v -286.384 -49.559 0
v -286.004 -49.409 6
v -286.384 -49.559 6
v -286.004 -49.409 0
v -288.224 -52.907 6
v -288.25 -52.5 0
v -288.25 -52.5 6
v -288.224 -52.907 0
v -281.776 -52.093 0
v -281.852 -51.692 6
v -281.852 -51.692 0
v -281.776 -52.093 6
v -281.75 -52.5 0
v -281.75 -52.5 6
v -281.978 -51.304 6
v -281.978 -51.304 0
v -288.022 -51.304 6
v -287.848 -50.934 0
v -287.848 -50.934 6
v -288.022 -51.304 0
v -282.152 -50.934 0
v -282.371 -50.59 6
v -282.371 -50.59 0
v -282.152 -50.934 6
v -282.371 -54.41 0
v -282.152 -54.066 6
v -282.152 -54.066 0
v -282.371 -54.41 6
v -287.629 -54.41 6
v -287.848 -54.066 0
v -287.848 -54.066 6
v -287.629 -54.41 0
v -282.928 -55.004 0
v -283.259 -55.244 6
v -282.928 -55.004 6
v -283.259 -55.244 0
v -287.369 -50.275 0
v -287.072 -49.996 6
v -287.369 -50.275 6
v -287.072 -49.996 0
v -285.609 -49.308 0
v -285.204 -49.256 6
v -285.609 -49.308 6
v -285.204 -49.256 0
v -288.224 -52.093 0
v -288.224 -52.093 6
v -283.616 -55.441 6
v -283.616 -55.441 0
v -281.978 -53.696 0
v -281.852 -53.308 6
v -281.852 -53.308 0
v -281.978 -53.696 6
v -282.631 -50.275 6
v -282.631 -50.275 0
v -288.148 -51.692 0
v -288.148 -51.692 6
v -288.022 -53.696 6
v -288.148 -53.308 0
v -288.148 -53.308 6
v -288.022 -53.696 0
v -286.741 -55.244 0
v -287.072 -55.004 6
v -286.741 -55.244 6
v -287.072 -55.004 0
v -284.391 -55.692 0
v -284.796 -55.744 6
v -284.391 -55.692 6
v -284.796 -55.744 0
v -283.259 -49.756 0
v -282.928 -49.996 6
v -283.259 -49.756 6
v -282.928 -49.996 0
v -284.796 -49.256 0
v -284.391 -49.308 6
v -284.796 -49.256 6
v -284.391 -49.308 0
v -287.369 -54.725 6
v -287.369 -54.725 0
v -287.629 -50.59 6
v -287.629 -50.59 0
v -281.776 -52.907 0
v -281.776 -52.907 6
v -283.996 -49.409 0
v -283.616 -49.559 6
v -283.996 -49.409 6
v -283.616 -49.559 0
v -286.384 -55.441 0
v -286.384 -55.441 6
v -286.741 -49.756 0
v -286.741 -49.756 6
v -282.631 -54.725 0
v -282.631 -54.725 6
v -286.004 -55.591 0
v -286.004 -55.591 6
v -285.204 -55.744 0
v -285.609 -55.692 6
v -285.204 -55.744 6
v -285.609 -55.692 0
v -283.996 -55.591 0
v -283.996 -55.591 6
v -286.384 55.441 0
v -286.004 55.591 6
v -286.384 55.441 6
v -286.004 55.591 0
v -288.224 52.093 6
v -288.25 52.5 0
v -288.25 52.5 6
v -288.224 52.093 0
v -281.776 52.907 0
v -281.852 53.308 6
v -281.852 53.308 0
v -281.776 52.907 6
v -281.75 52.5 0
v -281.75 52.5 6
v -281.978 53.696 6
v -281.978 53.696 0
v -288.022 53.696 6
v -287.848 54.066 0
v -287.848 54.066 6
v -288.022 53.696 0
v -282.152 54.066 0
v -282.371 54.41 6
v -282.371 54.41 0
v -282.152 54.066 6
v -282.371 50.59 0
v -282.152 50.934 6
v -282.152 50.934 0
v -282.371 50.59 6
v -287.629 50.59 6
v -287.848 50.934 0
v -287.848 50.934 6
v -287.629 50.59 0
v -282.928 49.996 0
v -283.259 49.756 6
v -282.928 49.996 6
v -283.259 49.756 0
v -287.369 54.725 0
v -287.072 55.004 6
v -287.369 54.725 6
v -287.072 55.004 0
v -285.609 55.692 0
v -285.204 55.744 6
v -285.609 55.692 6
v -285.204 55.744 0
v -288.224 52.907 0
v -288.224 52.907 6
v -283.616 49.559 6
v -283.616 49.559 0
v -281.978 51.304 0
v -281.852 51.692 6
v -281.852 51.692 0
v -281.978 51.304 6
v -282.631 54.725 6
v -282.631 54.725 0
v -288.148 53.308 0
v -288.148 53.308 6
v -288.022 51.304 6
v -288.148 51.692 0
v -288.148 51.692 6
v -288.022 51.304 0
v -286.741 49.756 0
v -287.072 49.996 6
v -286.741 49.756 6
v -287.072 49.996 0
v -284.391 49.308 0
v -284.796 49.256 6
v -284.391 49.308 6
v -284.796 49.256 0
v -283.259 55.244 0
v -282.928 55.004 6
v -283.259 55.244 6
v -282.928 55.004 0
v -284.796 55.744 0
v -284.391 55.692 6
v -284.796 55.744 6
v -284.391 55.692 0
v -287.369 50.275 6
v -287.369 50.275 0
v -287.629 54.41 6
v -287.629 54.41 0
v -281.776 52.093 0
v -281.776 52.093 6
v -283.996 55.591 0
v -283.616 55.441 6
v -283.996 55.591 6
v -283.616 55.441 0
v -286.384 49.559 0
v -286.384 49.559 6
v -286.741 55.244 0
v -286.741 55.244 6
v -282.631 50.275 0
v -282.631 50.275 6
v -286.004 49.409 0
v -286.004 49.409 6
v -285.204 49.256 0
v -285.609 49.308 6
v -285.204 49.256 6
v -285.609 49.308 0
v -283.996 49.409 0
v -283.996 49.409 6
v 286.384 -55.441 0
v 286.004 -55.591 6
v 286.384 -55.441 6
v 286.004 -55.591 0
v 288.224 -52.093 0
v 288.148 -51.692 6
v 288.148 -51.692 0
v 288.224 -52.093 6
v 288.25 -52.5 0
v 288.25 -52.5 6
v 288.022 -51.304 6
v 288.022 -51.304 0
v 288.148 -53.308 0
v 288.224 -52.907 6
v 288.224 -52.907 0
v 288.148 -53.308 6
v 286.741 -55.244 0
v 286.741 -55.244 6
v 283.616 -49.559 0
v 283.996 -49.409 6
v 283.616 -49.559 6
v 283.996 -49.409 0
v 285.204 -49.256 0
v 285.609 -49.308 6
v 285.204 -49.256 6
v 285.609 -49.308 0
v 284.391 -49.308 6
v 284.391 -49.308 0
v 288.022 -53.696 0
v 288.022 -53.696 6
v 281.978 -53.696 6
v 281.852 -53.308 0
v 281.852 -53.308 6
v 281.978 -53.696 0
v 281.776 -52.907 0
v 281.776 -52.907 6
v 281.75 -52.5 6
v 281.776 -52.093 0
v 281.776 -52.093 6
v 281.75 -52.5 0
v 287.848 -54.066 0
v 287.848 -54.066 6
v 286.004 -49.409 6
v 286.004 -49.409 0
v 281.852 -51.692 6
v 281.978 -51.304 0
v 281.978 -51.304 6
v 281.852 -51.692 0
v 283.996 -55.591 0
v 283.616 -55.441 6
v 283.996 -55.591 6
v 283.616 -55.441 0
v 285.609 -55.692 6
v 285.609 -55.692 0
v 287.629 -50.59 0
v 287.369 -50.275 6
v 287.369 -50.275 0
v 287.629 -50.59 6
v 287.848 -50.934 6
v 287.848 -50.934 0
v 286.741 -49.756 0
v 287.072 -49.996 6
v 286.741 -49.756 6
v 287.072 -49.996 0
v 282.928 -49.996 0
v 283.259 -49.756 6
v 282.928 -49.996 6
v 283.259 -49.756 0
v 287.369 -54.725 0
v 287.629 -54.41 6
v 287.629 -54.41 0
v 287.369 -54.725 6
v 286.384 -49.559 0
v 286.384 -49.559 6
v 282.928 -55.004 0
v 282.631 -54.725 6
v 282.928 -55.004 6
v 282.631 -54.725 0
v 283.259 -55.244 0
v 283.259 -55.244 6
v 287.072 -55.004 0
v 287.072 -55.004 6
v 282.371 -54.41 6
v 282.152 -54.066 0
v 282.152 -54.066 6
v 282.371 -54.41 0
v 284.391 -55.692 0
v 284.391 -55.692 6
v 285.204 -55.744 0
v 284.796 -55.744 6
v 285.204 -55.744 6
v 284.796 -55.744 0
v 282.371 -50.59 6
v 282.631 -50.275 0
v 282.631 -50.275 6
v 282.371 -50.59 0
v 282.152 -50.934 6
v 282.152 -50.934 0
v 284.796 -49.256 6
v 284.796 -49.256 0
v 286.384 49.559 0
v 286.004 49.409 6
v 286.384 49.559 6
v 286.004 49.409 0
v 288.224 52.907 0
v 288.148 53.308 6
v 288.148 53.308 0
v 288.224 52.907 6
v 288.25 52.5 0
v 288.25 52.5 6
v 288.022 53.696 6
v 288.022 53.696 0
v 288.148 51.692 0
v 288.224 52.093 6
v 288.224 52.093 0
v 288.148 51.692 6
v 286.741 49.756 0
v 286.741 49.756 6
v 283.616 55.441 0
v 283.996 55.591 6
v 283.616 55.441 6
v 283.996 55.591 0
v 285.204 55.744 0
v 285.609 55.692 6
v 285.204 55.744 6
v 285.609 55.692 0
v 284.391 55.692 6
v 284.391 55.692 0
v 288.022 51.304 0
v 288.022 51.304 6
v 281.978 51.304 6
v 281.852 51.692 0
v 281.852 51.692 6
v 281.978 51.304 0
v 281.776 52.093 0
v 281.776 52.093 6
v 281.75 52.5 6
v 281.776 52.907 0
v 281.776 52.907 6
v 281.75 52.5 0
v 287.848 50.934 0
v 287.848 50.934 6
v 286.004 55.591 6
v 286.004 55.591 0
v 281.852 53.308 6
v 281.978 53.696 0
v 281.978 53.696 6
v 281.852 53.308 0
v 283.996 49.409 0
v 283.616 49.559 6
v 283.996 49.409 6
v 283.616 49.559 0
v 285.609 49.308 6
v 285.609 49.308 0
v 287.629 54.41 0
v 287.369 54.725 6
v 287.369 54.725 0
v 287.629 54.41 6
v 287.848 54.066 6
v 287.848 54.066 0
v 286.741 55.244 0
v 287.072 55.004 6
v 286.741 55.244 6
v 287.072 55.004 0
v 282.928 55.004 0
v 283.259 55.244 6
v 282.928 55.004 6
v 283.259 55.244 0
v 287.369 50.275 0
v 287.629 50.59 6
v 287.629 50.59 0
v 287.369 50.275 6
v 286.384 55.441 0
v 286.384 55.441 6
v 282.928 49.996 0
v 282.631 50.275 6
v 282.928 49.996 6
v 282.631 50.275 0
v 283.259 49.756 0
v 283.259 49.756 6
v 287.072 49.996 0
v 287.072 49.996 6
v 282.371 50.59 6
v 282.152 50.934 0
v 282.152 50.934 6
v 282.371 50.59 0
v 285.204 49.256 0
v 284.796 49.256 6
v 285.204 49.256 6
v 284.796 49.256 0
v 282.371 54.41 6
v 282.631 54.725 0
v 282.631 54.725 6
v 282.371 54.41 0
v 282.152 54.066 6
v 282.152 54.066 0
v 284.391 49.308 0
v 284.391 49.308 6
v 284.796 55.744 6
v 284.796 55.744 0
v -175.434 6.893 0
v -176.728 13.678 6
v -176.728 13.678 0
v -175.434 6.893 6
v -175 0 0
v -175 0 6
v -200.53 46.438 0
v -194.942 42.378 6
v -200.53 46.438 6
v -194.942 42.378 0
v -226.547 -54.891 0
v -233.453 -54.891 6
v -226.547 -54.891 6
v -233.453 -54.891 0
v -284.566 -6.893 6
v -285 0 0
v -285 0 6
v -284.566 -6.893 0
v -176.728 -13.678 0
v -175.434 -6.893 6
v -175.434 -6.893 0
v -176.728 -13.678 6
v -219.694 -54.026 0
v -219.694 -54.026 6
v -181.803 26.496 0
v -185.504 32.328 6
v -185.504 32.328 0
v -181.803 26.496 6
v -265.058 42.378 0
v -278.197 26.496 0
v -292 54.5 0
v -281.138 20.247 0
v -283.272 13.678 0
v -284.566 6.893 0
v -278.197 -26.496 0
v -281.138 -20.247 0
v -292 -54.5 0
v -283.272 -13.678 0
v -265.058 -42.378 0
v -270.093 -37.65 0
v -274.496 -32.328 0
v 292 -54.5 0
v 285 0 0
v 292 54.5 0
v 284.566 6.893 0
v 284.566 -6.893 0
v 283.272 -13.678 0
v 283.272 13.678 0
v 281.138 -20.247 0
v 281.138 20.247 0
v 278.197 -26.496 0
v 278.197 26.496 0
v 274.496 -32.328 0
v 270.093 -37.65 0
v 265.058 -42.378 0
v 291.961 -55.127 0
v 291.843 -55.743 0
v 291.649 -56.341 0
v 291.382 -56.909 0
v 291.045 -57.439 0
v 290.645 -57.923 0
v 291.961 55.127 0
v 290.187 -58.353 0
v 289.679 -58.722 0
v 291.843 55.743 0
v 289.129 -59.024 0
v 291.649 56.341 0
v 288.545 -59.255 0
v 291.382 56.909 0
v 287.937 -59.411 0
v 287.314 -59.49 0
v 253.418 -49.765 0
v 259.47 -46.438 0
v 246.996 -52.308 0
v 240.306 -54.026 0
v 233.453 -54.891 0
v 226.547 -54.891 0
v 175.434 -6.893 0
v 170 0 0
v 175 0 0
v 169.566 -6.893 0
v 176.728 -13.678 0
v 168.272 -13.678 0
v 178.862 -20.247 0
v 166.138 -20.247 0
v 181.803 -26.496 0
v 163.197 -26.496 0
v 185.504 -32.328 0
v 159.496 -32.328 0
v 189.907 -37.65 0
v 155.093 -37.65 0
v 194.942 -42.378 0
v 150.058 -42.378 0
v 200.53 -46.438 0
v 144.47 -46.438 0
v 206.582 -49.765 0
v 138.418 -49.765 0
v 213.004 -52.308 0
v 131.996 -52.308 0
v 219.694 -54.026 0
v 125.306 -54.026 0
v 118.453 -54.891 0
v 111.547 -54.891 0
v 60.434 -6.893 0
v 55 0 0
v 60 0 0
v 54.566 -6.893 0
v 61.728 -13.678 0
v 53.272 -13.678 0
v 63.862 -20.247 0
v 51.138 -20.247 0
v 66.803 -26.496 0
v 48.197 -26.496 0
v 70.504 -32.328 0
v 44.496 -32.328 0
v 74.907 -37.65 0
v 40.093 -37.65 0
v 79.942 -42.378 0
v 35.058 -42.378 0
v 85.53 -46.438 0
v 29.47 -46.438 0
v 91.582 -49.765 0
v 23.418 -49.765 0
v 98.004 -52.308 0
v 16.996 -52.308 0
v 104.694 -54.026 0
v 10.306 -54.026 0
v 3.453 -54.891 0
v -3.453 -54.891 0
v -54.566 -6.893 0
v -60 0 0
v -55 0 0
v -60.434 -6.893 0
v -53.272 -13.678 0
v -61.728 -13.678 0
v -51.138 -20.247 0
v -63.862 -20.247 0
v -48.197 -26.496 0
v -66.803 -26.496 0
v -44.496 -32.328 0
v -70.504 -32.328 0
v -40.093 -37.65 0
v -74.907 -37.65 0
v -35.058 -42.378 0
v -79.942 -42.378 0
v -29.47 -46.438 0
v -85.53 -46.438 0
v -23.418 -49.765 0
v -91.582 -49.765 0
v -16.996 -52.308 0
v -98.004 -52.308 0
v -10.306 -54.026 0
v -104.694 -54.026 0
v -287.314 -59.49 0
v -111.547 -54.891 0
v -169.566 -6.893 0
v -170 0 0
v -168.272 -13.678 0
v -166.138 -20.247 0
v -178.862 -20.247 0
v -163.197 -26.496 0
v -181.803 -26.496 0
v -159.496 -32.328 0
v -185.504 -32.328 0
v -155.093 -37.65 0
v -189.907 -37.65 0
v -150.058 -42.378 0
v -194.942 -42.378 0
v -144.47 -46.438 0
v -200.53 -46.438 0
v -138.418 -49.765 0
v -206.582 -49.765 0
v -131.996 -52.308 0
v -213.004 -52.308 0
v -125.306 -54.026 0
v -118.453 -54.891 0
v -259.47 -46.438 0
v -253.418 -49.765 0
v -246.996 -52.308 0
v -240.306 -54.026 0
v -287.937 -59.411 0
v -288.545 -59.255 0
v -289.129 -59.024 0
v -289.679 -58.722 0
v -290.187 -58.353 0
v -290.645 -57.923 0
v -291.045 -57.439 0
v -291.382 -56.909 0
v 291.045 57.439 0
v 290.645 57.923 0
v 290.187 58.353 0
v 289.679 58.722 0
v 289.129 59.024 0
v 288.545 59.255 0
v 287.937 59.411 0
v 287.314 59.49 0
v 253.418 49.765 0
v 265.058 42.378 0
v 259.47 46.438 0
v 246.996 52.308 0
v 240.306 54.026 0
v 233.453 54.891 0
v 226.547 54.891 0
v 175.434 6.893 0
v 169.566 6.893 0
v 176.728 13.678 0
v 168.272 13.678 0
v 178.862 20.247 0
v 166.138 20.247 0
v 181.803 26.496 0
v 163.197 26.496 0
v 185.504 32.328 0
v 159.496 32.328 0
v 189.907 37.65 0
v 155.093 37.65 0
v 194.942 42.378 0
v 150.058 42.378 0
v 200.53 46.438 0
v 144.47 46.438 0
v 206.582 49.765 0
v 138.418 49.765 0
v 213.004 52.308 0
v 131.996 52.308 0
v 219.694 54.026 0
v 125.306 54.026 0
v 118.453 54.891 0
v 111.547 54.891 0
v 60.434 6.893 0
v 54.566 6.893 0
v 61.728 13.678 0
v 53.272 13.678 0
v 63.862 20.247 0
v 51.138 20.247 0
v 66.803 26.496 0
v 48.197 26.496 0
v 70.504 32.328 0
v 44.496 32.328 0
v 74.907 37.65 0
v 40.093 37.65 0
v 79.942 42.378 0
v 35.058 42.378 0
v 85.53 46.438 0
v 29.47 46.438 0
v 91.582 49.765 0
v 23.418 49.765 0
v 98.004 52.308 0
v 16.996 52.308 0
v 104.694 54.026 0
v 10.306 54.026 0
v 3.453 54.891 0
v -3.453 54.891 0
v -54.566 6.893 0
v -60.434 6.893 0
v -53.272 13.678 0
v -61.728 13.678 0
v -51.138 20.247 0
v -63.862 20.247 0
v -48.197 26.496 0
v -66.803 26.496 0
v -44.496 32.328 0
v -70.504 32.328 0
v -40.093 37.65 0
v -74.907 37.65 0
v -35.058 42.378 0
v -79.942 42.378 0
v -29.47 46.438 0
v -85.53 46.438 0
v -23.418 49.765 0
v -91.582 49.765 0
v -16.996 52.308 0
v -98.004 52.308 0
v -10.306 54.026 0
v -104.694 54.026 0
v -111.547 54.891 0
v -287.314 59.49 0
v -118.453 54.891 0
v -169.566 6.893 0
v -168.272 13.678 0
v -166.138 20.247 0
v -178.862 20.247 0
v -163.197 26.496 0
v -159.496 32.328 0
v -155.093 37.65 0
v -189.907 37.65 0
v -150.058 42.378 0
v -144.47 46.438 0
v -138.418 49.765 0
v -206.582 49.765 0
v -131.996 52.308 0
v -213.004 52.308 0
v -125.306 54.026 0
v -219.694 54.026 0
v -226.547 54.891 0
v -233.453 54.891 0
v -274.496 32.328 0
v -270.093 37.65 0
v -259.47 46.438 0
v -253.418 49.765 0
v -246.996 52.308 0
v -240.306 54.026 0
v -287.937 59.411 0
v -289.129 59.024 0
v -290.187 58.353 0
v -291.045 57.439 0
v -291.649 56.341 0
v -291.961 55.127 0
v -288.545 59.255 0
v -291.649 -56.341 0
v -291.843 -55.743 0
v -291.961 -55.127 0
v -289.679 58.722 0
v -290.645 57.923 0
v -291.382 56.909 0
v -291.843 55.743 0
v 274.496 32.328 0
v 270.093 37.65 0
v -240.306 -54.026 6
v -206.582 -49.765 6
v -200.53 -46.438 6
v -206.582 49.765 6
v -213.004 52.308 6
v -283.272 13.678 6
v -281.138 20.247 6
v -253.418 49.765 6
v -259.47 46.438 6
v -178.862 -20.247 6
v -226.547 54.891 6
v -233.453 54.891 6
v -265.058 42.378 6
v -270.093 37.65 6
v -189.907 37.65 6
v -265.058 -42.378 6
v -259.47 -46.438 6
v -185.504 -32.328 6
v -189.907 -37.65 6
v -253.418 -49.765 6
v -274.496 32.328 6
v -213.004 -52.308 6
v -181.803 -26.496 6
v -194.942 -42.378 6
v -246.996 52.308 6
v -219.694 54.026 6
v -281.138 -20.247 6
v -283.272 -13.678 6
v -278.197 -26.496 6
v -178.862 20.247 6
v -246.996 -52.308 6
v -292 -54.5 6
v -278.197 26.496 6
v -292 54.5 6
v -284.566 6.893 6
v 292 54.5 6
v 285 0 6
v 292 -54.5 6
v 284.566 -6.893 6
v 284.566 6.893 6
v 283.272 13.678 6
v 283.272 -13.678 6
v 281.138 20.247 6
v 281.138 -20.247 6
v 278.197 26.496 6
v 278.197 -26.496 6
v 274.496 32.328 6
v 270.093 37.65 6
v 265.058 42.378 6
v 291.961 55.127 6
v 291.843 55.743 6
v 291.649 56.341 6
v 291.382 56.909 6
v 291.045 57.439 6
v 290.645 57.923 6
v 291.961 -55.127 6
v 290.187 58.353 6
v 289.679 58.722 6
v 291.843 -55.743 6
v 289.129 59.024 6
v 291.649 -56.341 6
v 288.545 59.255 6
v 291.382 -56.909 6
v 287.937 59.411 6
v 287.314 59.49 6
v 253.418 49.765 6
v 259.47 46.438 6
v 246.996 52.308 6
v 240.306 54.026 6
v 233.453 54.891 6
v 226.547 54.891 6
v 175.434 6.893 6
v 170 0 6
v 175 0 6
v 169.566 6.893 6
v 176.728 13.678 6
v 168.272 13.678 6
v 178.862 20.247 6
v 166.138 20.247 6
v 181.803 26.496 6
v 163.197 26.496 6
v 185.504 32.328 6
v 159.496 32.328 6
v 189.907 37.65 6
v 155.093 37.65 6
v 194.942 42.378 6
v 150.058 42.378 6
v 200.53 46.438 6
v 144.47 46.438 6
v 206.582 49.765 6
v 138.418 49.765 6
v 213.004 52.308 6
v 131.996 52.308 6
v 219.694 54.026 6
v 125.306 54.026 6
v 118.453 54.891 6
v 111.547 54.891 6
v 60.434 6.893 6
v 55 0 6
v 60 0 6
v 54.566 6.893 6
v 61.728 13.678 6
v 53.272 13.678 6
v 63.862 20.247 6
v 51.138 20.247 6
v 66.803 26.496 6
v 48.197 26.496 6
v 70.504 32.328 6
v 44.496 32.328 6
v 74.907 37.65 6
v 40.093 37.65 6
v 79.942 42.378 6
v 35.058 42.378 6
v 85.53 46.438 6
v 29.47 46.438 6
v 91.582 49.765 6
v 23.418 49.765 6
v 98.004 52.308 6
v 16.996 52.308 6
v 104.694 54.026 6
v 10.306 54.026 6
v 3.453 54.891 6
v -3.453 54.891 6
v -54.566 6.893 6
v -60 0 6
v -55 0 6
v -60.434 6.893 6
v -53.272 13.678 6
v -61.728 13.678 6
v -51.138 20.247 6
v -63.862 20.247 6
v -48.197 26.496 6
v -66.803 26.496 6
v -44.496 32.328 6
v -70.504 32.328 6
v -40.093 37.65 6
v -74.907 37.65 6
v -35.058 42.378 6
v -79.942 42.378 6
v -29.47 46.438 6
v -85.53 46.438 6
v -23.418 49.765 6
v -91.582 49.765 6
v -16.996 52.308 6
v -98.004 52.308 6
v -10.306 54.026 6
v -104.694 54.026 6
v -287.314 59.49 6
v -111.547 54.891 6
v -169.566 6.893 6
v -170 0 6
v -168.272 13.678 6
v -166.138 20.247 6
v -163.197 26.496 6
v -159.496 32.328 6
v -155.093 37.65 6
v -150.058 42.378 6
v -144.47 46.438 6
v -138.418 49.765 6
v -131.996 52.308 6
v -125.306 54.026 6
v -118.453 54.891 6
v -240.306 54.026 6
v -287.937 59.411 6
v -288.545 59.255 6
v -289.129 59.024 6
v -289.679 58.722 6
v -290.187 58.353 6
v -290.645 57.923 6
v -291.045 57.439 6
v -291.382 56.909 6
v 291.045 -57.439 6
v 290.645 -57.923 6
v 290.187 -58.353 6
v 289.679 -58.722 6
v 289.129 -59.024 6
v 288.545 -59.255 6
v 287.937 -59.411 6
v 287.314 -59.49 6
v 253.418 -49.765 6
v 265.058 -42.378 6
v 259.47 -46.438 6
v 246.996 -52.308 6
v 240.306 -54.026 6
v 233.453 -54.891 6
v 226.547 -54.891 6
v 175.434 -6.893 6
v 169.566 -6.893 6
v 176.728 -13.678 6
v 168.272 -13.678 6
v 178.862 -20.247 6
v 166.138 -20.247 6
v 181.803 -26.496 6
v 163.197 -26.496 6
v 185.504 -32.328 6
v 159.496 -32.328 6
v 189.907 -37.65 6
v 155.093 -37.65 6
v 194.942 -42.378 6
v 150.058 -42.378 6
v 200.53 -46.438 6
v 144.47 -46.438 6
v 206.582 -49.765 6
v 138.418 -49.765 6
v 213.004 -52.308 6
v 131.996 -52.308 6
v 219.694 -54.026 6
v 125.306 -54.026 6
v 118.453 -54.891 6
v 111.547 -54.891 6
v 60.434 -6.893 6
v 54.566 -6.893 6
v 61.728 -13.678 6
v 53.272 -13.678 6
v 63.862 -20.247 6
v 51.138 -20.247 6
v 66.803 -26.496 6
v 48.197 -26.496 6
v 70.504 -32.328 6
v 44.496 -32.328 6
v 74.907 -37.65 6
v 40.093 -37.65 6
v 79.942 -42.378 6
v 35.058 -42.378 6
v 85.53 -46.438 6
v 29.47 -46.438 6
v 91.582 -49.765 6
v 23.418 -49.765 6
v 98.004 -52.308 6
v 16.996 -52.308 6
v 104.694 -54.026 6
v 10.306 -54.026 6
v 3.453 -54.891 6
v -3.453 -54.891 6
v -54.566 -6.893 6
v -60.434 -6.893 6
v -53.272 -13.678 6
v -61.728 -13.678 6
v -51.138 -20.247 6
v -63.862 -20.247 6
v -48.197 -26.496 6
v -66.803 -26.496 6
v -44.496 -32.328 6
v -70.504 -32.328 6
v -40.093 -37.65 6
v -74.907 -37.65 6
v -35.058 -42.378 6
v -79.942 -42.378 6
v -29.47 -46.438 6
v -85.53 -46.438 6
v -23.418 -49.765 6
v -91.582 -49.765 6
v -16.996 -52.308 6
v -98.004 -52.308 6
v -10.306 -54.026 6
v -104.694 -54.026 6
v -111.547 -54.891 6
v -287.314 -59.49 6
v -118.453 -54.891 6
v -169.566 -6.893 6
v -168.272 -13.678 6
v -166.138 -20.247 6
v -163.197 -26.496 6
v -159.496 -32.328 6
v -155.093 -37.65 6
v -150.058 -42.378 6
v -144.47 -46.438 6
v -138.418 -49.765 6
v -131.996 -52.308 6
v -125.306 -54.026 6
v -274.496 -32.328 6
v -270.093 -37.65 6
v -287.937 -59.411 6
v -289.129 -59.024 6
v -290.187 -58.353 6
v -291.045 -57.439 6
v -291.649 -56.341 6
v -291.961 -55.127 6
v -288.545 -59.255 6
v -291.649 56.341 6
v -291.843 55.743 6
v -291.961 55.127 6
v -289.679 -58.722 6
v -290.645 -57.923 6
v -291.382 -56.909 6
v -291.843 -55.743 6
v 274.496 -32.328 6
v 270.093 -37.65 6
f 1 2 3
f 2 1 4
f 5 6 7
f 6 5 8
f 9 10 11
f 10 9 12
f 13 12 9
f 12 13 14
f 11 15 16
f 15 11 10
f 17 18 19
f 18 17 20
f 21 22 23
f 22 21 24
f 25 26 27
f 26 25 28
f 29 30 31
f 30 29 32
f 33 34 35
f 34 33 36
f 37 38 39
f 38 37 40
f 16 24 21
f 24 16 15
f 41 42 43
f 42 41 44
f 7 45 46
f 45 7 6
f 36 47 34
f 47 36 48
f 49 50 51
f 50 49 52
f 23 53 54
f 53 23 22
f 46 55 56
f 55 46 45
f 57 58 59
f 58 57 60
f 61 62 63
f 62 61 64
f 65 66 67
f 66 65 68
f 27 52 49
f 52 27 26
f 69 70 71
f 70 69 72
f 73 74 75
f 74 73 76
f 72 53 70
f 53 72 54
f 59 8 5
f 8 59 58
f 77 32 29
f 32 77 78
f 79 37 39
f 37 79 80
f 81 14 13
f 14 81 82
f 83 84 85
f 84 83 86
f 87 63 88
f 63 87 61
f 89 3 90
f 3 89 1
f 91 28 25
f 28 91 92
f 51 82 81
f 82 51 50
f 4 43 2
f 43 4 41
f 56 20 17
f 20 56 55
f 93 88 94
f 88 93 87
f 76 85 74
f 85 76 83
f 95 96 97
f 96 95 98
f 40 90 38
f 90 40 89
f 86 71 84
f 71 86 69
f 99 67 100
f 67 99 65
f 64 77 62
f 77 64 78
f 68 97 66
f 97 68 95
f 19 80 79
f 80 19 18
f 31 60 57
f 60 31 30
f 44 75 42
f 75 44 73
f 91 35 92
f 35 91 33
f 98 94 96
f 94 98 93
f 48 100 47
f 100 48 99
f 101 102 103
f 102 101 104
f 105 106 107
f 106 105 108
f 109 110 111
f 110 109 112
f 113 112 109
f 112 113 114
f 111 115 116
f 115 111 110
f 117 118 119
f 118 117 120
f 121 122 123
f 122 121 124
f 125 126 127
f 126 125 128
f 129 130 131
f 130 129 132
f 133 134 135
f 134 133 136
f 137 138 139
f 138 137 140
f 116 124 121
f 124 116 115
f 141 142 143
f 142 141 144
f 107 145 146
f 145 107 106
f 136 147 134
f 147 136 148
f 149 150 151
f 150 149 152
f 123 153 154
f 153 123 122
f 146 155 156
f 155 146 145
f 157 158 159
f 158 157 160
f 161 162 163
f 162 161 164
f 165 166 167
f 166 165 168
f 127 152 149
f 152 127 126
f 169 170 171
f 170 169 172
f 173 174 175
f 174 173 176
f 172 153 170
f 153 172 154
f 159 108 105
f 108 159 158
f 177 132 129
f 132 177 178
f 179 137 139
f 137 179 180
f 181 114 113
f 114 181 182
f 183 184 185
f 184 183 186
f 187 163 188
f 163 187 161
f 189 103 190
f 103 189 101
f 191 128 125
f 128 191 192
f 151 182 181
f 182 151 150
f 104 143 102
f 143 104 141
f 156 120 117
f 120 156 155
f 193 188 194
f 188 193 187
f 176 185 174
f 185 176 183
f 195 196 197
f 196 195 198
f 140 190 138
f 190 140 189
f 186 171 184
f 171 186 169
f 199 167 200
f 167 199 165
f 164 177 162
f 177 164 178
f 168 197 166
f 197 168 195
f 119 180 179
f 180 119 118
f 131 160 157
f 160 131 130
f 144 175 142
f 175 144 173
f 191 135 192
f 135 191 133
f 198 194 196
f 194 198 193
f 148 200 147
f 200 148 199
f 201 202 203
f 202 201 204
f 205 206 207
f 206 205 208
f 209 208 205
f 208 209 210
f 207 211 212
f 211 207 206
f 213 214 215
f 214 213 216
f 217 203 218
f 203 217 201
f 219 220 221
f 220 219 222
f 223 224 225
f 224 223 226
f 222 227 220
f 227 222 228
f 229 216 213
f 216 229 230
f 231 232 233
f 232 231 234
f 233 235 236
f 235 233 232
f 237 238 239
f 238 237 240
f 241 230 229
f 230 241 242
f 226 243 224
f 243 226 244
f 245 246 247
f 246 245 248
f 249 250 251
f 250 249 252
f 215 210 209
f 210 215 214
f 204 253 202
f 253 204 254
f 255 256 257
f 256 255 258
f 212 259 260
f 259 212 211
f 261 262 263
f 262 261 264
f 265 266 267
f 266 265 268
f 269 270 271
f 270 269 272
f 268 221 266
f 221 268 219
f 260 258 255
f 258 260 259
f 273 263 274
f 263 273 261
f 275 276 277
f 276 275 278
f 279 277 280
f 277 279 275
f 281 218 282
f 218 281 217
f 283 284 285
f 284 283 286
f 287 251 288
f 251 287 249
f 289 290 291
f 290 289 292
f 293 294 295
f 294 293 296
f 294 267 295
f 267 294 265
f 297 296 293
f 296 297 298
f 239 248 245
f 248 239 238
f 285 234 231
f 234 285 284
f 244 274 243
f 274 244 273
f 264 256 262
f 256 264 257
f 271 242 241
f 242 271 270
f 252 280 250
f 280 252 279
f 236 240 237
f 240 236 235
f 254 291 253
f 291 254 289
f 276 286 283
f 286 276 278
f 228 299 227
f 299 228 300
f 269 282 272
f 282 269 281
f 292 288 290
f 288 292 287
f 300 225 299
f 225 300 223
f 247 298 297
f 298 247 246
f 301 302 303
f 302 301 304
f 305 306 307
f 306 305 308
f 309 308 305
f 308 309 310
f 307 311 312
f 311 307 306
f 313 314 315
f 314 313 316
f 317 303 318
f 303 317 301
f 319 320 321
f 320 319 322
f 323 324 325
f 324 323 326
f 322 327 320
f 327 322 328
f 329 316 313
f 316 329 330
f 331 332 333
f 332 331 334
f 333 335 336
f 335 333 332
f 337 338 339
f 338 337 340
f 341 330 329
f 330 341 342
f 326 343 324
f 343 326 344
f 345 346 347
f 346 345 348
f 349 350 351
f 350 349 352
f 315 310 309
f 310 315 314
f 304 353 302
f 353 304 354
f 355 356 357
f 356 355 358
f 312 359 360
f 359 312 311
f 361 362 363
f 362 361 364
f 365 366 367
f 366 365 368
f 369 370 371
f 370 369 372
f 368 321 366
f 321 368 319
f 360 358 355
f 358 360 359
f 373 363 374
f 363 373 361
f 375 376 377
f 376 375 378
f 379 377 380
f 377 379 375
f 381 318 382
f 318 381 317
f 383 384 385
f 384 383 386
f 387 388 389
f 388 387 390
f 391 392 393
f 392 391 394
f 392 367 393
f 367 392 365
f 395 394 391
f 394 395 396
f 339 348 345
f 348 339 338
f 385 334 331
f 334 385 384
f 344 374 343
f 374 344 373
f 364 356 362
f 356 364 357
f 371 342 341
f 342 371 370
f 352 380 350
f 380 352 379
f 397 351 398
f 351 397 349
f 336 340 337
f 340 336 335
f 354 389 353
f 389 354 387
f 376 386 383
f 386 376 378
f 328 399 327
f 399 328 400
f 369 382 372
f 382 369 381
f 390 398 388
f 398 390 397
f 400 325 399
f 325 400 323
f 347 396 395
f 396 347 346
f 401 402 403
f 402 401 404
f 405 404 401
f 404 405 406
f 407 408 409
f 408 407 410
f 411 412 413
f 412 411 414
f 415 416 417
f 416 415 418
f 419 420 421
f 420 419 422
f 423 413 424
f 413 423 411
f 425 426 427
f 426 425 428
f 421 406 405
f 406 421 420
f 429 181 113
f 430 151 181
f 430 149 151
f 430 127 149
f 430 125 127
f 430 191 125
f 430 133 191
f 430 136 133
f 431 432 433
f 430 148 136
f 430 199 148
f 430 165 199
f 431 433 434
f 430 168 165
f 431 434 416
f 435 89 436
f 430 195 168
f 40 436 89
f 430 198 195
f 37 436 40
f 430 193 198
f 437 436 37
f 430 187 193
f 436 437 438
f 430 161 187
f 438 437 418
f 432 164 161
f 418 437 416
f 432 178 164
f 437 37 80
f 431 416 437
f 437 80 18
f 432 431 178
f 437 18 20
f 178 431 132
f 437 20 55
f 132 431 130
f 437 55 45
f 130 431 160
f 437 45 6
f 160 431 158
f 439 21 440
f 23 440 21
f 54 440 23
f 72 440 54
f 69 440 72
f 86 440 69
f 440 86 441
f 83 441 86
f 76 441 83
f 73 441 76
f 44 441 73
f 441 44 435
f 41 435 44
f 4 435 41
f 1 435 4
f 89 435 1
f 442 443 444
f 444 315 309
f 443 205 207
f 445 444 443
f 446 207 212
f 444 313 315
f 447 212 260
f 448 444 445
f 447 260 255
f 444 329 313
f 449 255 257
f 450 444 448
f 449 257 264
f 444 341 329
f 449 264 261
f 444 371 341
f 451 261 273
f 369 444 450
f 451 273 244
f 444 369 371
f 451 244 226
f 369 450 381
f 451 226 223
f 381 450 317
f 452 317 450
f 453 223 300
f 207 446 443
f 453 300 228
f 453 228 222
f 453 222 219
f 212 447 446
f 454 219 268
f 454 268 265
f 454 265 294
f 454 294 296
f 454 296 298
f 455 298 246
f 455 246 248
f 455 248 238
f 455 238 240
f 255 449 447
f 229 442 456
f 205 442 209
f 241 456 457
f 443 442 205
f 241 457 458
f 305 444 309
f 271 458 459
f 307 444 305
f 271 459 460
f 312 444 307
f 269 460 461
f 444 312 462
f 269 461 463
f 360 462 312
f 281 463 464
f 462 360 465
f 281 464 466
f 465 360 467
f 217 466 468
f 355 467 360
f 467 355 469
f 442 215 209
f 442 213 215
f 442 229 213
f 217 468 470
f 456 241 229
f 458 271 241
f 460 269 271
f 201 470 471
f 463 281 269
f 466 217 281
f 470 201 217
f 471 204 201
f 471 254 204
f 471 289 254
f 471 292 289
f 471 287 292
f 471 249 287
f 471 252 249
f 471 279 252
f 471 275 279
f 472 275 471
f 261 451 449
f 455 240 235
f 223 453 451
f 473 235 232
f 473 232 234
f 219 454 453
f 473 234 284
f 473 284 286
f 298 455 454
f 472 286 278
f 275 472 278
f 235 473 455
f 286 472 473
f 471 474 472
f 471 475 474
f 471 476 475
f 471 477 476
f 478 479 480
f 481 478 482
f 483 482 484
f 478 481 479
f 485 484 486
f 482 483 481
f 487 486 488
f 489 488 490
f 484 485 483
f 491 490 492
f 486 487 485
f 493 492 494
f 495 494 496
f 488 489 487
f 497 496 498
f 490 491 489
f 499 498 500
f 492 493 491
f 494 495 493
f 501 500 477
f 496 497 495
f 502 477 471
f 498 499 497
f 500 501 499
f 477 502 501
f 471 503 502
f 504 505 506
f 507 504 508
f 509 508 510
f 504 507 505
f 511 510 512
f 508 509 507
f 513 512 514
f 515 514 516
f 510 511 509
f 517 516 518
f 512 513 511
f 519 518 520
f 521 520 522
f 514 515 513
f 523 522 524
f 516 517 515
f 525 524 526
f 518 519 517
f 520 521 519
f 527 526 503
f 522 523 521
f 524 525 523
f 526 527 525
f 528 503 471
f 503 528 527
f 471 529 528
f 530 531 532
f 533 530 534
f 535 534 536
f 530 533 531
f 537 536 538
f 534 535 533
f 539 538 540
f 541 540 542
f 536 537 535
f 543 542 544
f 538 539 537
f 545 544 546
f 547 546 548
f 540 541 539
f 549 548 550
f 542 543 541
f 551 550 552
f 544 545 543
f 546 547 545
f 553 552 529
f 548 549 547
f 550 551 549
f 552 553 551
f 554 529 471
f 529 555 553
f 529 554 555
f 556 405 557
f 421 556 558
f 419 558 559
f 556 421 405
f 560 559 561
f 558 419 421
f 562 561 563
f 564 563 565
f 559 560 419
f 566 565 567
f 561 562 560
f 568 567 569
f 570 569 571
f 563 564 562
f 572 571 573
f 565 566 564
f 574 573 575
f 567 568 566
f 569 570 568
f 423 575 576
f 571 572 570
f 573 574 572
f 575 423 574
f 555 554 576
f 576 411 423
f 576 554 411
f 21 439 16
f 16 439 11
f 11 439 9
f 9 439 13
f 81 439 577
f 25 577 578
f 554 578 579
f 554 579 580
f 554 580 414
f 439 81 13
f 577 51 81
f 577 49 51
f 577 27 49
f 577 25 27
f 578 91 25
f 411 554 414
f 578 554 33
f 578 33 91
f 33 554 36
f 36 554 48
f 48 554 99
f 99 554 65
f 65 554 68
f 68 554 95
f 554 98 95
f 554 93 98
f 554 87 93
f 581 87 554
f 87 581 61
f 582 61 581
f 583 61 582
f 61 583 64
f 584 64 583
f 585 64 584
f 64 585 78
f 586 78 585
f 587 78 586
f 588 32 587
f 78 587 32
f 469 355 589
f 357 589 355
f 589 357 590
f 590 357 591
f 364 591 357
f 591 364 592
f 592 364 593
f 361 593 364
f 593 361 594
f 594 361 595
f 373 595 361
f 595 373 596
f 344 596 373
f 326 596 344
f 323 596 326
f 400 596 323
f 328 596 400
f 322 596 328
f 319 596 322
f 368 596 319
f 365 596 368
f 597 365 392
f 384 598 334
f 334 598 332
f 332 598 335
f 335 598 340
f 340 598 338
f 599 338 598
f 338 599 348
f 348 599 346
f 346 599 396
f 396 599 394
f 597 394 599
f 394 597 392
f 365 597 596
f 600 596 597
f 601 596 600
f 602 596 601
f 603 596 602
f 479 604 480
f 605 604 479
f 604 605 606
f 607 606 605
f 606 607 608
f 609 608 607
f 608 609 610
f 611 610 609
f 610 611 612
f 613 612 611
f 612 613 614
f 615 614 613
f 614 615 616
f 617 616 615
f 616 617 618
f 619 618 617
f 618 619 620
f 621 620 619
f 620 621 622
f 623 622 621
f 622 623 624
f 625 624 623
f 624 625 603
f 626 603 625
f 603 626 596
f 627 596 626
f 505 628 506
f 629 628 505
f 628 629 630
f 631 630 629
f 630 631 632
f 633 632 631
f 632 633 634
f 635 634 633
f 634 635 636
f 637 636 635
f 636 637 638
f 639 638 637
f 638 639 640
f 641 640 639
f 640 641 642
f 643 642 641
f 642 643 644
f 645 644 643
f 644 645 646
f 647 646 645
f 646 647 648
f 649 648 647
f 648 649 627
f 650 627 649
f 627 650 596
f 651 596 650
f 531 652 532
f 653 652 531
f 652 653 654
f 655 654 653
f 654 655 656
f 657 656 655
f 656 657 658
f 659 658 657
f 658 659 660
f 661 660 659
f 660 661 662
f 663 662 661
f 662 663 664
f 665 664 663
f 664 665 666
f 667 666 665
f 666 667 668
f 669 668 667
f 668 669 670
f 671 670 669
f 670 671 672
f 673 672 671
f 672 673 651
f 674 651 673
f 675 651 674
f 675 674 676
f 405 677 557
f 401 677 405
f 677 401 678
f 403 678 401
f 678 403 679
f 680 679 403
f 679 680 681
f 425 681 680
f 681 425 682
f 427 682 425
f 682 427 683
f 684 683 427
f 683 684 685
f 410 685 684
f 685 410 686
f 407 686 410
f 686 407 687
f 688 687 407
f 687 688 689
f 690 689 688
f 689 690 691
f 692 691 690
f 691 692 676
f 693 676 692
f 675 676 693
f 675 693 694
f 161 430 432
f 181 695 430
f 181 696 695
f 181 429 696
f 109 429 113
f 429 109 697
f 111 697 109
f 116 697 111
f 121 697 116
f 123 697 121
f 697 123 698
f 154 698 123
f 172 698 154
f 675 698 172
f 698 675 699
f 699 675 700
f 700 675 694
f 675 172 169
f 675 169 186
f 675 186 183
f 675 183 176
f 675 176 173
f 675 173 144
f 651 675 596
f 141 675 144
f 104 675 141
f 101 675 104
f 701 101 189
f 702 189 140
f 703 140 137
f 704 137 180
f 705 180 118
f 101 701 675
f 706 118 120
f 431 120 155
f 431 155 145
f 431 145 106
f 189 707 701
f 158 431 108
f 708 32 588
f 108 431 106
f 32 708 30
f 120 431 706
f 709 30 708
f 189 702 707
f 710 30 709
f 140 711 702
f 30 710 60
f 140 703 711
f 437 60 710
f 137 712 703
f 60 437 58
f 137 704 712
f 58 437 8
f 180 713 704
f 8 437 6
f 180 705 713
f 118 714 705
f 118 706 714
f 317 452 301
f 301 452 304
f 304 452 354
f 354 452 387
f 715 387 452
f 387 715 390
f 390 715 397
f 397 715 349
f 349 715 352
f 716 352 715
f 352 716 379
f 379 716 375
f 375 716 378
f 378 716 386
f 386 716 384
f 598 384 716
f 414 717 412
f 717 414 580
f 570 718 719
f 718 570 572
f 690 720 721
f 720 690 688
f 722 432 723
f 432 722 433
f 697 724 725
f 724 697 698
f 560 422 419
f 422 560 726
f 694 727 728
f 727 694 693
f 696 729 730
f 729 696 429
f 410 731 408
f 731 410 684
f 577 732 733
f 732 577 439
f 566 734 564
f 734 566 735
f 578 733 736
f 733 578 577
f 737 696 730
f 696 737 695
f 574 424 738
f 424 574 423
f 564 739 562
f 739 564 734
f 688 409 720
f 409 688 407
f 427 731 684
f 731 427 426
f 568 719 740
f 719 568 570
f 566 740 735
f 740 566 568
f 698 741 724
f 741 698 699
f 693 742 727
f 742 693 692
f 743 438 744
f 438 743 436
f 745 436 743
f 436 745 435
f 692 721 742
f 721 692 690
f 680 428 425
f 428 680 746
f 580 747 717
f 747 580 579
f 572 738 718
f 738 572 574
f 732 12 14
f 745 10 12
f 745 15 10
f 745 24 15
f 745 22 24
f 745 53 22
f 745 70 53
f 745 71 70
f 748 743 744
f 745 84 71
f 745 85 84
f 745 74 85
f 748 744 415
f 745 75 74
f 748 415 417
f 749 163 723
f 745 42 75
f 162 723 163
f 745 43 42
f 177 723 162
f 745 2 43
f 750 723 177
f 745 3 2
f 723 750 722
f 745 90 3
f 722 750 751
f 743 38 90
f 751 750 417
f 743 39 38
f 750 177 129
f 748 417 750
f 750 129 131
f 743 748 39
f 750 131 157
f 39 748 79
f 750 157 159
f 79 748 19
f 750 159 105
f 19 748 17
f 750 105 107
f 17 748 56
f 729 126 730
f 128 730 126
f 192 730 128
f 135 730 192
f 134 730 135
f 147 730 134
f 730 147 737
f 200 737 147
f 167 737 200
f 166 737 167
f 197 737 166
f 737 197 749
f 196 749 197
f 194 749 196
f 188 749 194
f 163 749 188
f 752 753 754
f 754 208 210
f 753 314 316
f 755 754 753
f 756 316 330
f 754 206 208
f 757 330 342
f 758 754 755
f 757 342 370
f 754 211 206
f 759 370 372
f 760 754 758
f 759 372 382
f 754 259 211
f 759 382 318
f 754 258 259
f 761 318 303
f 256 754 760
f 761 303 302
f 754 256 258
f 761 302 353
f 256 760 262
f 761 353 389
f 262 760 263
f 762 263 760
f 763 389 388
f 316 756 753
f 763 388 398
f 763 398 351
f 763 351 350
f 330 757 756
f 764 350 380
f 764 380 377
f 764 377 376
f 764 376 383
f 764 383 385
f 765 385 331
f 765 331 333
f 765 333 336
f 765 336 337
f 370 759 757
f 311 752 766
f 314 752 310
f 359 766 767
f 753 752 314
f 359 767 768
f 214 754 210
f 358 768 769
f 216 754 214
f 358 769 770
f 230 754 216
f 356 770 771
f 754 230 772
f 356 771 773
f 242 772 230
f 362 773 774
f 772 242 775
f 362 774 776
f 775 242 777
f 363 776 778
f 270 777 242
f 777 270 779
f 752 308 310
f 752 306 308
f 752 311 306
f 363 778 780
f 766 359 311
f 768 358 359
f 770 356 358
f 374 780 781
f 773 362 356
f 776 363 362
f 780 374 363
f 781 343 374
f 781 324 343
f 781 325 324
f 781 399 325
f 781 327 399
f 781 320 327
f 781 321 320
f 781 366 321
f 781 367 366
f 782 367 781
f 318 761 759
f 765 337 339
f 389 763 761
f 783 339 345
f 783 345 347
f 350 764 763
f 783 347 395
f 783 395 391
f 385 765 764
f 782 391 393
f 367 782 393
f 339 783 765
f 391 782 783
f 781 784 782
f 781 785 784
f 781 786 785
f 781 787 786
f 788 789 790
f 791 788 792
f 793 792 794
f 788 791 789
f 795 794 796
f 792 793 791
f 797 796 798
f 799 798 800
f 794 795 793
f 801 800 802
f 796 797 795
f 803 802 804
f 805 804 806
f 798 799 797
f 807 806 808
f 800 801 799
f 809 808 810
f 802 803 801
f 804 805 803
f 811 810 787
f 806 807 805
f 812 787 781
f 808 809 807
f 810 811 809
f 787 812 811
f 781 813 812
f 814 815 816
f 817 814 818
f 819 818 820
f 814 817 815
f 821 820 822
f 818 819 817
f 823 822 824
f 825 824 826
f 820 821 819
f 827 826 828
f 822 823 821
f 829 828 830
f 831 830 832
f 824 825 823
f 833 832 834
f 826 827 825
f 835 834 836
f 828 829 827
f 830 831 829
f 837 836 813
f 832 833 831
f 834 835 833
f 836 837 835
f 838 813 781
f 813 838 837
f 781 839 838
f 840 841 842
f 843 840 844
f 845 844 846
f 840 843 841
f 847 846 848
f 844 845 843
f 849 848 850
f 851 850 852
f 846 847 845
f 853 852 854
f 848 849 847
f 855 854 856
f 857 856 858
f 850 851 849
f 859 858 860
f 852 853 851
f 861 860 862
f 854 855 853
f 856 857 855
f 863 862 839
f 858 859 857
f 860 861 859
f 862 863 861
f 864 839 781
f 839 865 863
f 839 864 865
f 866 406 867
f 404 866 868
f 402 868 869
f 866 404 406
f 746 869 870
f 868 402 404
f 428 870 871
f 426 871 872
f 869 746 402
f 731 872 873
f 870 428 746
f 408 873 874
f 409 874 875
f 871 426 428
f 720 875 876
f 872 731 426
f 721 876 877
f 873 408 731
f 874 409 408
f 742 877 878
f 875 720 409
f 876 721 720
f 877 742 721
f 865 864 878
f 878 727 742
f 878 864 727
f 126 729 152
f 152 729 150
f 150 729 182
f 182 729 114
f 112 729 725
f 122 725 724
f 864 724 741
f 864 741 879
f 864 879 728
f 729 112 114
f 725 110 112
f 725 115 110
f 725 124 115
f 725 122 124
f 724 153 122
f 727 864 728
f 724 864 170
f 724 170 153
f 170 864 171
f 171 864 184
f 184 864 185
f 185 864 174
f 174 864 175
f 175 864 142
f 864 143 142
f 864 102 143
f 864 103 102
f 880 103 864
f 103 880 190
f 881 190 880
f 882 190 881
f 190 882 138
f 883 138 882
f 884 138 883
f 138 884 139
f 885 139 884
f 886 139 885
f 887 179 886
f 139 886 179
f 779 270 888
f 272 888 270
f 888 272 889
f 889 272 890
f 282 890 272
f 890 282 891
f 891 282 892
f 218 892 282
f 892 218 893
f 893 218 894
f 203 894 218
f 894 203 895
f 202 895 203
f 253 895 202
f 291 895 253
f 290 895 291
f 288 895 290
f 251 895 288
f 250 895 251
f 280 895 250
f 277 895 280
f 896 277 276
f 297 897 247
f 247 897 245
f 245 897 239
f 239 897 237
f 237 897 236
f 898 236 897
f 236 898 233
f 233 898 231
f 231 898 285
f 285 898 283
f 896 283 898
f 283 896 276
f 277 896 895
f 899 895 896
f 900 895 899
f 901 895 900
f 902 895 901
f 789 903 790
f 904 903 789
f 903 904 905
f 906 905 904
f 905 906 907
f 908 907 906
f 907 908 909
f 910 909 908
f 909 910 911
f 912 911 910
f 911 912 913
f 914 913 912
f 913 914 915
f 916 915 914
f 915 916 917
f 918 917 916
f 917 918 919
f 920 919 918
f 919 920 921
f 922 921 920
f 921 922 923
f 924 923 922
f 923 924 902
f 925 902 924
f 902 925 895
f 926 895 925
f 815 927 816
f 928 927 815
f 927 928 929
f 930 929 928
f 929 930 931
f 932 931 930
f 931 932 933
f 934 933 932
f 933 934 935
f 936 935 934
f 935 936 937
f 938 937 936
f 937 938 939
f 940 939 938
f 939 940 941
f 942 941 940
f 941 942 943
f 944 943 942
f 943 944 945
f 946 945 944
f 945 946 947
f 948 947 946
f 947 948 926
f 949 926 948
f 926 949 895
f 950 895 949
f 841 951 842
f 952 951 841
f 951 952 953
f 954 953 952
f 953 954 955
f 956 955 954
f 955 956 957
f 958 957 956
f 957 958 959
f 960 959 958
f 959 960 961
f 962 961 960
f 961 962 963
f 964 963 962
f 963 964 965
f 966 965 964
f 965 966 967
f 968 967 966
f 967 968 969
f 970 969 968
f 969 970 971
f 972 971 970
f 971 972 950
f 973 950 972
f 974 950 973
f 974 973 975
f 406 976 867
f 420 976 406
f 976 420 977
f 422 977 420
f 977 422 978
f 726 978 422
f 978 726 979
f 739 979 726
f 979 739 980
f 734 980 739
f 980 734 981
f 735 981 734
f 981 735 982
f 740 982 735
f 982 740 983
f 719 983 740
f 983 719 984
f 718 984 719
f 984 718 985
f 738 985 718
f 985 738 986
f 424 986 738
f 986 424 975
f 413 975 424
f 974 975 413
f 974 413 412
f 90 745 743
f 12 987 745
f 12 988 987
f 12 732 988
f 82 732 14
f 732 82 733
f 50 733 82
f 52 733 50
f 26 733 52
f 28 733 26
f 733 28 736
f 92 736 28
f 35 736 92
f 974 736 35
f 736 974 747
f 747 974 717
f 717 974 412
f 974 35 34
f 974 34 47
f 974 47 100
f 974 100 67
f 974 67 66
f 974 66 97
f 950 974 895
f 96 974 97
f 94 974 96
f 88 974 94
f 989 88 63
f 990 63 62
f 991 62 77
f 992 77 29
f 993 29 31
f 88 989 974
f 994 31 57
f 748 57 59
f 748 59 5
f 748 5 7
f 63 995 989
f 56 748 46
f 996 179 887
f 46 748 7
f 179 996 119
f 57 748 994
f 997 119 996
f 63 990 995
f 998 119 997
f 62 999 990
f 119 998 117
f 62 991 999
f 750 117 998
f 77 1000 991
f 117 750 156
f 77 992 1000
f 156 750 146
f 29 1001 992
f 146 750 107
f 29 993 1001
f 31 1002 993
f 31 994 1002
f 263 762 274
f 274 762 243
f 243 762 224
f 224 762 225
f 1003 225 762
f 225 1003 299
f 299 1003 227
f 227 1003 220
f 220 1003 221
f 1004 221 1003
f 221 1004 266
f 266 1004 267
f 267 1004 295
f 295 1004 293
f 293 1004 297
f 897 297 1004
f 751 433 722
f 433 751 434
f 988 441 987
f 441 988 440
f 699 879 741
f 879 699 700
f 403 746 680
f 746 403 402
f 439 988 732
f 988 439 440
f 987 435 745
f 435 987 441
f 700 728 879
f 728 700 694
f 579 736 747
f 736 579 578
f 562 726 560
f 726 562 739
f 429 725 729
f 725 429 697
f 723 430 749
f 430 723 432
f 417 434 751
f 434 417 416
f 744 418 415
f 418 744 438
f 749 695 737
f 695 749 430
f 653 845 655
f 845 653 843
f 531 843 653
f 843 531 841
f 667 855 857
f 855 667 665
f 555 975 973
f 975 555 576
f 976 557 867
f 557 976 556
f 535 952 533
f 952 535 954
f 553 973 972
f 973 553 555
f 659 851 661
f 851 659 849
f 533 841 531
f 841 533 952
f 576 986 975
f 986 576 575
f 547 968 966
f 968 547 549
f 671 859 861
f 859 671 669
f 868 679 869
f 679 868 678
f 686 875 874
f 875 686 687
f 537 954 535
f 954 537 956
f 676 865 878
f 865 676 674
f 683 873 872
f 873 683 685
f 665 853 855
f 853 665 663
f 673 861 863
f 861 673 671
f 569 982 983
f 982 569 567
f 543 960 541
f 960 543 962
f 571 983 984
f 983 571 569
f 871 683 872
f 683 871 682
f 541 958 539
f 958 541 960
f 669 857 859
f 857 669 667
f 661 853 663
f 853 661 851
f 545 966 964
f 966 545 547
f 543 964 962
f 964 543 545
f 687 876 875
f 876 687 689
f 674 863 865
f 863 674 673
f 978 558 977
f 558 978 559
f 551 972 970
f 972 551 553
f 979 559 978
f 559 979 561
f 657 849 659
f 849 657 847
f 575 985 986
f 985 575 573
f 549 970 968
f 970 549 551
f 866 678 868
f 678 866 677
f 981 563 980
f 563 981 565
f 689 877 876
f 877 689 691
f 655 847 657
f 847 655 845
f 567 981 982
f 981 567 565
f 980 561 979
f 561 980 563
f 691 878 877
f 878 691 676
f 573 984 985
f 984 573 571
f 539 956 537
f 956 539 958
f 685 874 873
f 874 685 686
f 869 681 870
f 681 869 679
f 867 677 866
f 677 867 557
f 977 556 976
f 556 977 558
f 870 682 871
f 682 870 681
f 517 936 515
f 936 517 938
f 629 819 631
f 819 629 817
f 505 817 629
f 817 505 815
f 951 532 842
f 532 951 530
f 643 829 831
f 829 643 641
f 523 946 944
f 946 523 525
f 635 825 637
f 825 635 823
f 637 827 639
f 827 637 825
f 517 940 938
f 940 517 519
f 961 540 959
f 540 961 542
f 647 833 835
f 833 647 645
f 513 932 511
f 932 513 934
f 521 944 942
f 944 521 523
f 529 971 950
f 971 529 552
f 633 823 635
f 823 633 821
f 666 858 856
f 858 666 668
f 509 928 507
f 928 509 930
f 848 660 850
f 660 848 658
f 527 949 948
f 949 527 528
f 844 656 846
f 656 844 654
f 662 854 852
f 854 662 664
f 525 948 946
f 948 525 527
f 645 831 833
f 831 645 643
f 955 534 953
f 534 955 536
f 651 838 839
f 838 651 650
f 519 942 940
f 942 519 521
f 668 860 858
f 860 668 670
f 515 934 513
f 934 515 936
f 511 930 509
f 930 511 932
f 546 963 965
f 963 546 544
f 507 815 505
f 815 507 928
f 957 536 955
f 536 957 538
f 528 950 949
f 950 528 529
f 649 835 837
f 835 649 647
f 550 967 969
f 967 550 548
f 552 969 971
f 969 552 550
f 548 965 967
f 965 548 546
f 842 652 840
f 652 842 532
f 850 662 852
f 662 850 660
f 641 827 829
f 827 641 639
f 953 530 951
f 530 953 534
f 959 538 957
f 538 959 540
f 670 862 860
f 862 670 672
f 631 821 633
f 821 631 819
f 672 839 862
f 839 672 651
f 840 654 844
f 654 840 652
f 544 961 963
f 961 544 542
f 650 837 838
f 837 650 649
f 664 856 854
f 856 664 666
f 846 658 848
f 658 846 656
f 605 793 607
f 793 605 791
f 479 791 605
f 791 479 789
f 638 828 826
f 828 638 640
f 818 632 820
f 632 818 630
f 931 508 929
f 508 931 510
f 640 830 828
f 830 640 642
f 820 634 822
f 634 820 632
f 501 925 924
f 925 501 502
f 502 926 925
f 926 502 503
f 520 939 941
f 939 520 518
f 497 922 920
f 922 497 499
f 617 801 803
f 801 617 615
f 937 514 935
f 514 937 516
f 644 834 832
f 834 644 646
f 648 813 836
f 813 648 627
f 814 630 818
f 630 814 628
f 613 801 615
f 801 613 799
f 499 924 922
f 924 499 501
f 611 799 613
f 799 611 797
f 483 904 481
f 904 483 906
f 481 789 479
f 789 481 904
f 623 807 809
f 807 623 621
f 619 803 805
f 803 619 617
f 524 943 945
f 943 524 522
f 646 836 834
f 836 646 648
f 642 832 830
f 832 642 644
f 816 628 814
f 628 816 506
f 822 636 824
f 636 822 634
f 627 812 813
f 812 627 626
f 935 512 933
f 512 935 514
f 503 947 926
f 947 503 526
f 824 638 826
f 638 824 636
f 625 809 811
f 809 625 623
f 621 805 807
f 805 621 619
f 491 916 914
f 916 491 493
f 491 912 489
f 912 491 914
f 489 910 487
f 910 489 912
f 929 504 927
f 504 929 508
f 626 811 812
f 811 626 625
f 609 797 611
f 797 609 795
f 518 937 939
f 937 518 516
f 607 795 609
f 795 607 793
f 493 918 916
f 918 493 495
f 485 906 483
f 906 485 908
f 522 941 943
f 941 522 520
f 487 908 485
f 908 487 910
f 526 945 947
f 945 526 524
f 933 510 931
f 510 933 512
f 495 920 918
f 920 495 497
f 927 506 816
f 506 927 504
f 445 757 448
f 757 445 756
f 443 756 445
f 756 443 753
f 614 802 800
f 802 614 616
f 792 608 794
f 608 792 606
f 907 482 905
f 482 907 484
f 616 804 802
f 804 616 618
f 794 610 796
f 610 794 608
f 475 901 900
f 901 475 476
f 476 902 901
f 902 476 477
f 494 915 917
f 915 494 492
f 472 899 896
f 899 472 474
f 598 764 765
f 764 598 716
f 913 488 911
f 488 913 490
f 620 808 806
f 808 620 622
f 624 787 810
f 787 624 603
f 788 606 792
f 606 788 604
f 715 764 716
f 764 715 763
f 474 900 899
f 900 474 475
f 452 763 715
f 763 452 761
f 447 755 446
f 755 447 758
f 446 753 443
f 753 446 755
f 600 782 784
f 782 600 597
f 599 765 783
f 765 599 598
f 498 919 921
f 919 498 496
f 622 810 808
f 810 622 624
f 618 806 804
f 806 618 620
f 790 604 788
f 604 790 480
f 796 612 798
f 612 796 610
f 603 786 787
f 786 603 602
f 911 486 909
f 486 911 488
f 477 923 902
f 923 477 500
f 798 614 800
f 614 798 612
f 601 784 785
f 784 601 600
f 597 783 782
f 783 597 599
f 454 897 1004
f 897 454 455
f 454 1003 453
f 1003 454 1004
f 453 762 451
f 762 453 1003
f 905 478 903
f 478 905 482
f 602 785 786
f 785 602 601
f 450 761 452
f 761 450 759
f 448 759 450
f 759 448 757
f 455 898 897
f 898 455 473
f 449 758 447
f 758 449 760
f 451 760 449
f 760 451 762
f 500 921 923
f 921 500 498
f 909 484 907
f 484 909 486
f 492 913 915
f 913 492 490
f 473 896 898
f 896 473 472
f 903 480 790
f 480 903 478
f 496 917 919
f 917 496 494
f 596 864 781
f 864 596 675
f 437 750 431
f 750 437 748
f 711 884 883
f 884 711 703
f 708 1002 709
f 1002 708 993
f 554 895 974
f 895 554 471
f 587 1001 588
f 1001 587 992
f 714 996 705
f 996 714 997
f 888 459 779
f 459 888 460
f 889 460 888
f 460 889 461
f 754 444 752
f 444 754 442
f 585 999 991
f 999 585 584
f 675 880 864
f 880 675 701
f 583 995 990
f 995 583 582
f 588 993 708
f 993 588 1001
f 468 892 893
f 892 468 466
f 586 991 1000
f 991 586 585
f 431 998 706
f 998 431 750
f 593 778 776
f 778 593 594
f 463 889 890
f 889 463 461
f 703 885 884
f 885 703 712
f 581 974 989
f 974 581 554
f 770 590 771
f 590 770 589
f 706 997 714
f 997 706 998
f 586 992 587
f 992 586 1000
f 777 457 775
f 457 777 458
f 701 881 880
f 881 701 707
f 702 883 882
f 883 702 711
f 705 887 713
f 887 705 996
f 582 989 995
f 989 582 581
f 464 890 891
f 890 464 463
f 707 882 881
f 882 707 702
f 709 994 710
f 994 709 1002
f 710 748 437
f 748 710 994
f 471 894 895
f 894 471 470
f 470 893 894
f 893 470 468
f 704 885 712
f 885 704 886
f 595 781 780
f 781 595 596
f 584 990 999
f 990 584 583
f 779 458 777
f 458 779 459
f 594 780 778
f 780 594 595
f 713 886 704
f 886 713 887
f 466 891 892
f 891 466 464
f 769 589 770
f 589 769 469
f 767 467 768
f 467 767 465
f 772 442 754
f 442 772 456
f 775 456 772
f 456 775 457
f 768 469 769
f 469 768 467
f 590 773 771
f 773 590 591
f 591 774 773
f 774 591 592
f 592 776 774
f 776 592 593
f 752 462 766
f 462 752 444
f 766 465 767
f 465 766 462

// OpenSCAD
$fn = 50;

difference() {
	union() {
		hull() {
			translate(v = [-287.0, 54.5, 0]) {
				cylinder(h = 6, r = 5);
			}
			translate(v = [287.0, 54.5, 0]) {
				cylinder(h = 6, r = 5);
			}
			translate(v = [-287.0, -54.5, 0]) {
				cylinder(h = 6, r = 5);
			}
			translate(v = [287.0, -54.5, 0]) {
				cylinder(h = 6, r = 5);
			}
		}
	}
	union() {
		translate(v = [-285.0, -52.5, -100.0]) {
			cylinder(h = 200, r = 3.25);
		}
		translate(v = [-285.0, 52.5, -100.0]) {
			cylinder(h = 200, r = 3.25);
		}
		translate(v = [285.0, -52.5, -100.0]) {
			cylinder(h = 200, r = 3.25);
		}
		translate(v = [285.0, 52.5, -100.0]) {
			cylinder(h = 200, r = 3.25);
		}
		translate(v = [-285.0, -52.5, -100.0]) {
			cylinder(h = 200, r = 1.8);
		}
		translate(v = [-285.0, 52.5, -100.0]) {
			cylinder(h = 200, r = 1.8);
		}
		translate(v = [285.0, -52.5, -100.0]) {
			cylinder(h = 200, r = 1.8);
		}
		translate(v = [285.0, 52.5, -100.0]) {
			cylinder(h = 200, r = 1.8);
		}
		translate(v = [-230.0, 0, 0.0]) {
			cylinder(h = 6, r = 55.0);
		}
		translate(v = [-115.0, 0, 0.0]) {
			cylinder(h = 6, r = 55.0);
		}
		cylinder(h = 6, r = 55.0);
		translate(v = [115.0, 0, 0.0]) {
			cylinder(h = 6, r = 55.0);
		}
		translate(v = [230.0, 0, 0.0]) {
			cylinder(h = 6, r = 55.0);
		}
	}
}
